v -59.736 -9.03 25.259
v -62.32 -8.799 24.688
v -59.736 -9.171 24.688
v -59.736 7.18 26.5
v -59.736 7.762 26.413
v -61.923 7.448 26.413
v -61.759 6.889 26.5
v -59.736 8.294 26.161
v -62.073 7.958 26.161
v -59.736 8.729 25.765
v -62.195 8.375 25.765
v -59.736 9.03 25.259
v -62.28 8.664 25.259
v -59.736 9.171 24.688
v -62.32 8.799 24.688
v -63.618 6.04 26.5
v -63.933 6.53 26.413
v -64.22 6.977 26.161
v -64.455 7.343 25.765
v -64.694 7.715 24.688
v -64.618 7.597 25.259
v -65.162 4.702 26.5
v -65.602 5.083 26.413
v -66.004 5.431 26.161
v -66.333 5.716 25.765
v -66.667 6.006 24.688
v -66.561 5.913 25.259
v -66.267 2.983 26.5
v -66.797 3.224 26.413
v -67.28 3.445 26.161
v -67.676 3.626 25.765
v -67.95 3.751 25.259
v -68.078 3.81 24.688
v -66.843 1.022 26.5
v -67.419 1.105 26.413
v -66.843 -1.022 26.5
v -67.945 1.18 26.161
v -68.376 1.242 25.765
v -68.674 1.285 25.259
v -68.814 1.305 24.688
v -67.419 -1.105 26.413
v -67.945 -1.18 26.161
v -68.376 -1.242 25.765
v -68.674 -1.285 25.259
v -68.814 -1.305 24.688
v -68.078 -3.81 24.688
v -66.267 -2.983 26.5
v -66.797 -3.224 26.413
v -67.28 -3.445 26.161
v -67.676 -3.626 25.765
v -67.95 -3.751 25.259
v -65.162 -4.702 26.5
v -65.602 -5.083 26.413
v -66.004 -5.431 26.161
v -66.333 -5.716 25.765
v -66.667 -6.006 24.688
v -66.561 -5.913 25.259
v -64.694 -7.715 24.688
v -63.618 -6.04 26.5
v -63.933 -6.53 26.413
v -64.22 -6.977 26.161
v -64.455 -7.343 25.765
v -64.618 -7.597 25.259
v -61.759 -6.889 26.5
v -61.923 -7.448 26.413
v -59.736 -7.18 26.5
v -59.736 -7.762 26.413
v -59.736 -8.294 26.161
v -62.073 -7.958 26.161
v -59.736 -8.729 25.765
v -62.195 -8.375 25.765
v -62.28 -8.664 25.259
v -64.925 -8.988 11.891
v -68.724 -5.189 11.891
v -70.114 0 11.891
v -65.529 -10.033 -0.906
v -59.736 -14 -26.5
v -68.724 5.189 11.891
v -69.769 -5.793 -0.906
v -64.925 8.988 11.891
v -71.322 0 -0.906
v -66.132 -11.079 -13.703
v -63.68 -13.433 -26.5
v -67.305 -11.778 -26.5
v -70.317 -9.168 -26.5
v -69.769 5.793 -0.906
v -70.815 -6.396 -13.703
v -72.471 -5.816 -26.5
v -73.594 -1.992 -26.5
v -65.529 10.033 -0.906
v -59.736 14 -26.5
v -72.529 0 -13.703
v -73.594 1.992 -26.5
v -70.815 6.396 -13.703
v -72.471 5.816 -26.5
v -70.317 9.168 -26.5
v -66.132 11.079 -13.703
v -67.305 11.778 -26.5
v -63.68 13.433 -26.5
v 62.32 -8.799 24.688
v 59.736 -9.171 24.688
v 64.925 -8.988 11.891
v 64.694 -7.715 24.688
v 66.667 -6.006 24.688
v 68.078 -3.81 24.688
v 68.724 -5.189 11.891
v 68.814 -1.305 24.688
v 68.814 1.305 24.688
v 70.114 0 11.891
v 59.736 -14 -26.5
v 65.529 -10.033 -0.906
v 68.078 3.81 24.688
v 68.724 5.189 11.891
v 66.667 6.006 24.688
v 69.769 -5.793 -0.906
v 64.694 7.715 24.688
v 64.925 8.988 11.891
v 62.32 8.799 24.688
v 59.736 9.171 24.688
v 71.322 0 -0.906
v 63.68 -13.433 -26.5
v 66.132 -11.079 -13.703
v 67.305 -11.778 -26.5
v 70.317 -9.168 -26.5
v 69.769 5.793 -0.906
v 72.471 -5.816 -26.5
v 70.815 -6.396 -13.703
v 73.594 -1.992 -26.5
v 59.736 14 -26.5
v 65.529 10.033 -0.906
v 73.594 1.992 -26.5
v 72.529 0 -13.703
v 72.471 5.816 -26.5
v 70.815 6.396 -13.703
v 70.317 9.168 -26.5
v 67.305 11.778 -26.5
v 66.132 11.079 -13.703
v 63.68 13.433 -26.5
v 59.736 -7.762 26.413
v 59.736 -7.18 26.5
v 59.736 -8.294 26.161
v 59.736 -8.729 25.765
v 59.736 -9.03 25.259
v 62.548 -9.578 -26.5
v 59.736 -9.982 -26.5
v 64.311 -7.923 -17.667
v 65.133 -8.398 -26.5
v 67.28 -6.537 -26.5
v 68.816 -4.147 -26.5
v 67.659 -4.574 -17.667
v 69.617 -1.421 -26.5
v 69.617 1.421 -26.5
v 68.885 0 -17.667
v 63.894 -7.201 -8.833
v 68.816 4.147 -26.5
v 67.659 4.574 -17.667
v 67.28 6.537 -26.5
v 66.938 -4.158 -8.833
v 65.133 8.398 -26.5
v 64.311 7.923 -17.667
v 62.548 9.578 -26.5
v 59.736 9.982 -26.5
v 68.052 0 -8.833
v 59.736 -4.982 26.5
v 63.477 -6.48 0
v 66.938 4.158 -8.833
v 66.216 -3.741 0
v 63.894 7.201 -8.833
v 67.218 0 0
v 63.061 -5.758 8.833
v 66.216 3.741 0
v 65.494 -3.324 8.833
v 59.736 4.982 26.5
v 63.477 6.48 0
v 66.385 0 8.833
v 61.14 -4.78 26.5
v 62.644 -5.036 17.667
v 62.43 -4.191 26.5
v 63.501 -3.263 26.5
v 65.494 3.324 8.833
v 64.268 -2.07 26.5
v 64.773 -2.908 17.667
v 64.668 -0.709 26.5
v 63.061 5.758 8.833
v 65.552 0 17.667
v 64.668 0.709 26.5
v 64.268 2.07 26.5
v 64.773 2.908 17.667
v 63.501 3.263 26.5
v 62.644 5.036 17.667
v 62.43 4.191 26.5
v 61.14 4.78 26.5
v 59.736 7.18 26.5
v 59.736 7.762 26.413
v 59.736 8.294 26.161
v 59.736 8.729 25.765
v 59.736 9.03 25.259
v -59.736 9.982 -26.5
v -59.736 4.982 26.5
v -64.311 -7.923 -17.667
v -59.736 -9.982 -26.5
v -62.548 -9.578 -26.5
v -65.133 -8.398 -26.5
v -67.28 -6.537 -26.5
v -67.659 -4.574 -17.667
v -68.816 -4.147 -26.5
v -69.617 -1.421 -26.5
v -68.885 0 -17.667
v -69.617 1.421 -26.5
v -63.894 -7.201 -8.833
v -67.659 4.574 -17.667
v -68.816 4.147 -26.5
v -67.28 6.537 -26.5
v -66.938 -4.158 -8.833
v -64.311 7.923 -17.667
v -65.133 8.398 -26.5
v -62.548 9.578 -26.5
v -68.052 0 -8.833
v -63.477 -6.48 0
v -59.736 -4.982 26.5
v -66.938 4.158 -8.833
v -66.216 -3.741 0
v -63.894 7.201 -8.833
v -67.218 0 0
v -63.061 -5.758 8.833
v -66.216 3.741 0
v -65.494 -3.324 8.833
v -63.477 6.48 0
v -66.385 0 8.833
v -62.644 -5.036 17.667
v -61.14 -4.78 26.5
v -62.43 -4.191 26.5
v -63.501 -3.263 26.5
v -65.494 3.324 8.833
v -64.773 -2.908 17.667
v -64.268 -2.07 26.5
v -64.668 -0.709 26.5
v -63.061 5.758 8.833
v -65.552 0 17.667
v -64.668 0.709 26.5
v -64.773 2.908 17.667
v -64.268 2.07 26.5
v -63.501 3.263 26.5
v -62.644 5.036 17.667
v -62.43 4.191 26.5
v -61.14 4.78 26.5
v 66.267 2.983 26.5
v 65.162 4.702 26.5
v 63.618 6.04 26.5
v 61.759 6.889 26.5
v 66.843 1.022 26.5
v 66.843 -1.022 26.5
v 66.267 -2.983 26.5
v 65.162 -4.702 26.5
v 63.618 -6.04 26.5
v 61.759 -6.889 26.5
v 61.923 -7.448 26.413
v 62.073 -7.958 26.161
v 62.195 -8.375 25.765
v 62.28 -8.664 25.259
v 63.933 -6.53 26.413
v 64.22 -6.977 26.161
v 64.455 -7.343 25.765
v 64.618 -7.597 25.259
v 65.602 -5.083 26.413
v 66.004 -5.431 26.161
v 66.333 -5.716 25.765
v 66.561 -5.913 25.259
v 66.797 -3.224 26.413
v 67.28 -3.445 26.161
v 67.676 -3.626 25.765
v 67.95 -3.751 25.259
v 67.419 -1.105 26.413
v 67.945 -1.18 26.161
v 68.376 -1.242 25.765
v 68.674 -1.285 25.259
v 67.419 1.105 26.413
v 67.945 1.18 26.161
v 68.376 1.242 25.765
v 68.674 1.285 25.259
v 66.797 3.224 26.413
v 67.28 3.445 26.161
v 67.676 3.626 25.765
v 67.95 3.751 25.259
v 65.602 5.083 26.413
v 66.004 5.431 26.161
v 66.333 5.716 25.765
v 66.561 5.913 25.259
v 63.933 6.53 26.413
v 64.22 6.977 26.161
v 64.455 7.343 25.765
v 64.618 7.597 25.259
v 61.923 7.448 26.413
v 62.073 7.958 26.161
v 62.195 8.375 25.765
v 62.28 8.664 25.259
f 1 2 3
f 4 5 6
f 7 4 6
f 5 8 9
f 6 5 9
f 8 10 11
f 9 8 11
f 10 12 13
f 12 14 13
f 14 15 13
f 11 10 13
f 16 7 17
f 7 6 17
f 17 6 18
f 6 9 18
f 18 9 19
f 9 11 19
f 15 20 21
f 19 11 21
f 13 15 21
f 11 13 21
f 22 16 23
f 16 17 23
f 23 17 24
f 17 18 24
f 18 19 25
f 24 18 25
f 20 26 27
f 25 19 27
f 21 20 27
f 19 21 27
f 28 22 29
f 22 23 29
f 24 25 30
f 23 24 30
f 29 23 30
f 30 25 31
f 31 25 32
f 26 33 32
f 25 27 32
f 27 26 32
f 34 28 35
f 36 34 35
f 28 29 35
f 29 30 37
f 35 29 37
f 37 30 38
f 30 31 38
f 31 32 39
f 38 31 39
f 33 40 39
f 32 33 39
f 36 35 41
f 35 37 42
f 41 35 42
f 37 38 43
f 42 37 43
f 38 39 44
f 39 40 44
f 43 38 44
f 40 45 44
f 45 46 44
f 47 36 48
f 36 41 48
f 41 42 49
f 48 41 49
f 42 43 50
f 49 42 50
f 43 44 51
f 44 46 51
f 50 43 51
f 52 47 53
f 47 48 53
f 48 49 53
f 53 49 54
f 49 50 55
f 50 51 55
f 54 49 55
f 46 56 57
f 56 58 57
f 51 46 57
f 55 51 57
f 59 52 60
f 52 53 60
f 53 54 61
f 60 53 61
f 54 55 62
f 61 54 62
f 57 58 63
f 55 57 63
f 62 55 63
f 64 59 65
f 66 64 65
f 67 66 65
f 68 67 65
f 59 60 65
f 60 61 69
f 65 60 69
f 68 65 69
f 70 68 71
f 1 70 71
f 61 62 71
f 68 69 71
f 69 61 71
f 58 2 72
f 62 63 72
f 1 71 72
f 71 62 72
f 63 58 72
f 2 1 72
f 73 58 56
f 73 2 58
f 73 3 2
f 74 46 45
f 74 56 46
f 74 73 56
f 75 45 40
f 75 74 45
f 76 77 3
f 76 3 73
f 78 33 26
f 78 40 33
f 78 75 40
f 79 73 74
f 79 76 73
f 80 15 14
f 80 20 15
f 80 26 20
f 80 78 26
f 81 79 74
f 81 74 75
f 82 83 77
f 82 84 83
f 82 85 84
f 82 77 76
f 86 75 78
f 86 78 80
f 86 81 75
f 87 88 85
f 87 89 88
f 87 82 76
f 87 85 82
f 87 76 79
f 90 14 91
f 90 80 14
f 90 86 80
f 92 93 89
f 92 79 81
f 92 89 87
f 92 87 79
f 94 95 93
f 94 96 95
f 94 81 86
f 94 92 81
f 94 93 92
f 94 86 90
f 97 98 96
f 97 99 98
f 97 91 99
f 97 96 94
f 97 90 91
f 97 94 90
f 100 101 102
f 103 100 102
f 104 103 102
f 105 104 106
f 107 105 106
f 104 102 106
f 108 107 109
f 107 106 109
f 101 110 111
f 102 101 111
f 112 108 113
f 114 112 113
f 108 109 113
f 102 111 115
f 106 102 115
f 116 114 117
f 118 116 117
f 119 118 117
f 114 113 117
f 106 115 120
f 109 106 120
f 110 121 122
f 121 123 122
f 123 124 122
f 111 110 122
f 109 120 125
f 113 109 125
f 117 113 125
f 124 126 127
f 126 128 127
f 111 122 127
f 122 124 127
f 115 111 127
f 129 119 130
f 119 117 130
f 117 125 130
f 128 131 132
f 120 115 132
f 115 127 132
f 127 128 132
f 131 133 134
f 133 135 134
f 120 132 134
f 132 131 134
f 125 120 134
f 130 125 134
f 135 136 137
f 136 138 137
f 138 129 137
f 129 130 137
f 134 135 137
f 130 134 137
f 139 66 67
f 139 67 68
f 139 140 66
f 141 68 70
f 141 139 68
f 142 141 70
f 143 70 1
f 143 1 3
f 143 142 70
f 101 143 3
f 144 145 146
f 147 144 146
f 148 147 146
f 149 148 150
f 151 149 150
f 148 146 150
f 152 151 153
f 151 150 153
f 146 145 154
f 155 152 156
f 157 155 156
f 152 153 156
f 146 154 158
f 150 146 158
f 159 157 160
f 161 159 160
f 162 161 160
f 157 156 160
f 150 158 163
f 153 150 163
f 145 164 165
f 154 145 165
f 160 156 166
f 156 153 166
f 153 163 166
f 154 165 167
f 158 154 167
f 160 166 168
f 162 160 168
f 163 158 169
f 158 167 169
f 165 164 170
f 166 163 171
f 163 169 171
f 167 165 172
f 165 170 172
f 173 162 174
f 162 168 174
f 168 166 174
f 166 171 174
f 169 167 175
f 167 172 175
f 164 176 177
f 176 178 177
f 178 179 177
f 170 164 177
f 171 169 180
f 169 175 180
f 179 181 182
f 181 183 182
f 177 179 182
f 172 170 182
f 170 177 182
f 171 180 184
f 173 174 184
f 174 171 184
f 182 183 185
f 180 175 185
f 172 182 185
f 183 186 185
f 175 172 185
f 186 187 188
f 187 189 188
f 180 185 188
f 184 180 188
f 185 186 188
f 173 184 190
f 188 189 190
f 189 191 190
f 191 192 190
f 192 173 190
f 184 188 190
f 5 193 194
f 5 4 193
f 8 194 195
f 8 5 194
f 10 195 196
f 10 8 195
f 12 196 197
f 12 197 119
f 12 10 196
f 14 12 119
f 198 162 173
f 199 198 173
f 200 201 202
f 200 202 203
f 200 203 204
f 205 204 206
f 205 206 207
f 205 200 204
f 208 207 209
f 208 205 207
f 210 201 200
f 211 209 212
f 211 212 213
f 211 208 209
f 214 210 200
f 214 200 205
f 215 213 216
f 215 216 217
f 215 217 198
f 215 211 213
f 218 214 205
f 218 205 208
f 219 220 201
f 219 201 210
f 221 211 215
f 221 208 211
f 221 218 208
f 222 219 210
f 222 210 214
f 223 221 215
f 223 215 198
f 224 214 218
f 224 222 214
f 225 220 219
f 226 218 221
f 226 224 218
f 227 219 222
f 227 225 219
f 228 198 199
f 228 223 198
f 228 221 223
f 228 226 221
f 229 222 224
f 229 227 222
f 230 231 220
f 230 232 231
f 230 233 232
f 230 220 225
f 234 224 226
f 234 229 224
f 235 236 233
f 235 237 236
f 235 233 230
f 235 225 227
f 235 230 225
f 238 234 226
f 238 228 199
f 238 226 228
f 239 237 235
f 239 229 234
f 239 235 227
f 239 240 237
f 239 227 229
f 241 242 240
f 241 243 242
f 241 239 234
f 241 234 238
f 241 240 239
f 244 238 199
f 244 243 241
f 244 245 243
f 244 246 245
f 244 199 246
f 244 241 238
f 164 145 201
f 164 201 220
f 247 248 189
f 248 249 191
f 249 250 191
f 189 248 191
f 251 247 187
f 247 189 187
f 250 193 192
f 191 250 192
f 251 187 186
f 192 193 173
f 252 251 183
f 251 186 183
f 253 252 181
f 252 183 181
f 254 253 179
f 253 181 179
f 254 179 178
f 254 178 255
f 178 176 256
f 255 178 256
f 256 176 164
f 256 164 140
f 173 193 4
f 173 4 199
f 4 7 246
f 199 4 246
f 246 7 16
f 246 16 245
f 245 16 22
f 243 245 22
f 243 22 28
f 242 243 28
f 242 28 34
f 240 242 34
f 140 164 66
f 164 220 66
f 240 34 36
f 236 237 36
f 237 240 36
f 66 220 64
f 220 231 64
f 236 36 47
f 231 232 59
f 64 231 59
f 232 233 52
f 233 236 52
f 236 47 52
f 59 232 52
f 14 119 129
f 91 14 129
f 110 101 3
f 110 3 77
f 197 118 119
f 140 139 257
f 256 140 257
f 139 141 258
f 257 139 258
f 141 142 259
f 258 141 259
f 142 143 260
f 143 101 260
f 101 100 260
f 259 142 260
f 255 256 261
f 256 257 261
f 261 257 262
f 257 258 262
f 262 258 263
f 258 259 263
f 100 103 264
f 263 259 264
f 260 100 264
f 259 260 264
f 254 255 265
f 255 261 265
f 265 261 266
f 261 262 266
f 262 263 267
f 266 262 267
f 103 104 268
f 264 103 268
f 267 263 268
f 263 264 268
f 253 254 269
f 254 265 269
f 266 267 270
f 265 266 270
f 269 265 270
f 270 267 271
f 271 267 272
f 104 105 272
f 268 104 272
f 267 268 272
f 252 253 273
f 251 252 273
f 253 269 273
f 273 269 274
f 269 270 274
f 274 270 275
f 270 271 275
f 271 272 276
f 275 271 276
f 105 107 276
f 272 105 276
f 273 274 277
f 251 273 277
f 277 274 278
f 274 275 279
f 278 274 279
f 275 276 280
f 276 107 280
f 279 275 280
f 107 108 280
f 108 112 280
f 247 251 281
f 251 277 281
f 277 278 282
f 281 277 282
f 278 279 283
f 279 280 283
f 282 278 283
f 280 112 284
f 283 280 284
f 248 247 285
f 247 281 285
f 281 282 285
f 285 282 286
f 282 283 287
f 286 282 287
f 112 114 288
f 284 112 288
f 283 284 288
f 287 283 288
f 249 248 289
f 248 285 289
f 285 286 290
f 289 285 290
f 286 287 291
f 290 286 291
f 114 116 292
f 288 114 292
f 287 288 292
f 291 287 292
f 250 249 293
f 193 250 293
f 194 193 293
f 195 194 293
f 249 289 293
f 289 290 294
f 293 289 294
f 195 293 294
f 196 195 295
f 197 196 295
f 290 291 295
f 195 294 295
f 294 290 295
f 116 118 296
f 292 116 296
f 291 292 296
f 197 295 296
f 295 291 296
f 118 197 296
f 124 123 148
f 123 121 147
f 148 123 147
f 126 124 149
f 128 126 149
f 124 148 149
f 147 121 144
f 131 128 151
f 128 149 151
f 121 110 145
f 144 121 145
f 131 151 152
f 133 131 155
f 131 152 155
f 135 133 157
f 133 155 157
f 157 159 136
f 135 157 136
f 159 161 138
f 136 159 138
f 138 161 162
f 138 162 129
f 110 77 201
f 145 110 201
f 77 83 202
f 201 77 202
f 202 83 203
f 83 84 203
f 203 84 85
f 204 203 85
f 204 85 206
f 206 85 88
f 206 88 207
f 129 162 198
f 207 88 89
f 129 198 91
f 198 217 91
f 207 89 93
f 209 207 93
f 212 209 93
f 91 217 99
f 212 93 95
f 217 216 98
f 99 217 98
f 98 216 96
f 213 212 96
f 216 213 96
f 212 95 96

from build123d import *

# Parameters (mm, degrees)
F1_ANGLE_BACK = 90
F1_ANGLE      = 180
F3_DEPTH      = 119.4722198035
F4_R          = 2


with BuildPart() as f1:
    # F0 (on Front) → F1 (revolve)
    with BuildSketch(Plane.XZ, mode=Mode.PRIVATE) as f1_sk:
        Polygon((-73.7361099018, -26.5), (-69.7183494024, -26.5), (-64.7183494024, 26.5), (-68.7361099018, 26.5), align=None)
    revolve(f1_sk.sketch.rotate(Axis((-59.7361099018, 0, 0), (0, 0, -1)), -F1_ANGLE_BACK), axis=Axis((-59.7361099018, 0, 0), (0, 0, -1)), revolution_arc=F1_ANGLE)


with BuildPart() as f2_1:
    # F2: instance of F1
    add(f1.part.mirror(Plane.YZ))


with BuildPart() as f1_1:
    add(f1.part)

    # F3 (add, through all): faces of the model
    f3_faces = [f1_1.faces().sort_by_distance(p)[0] for p in [
        (-59.7361099018, -9.4911197503, 0),
        (-59.7361099018, 9.4911197503, 0),
    ]]

    add(f2_1.part)  # F3 merges F2_1
    extrude(f3_faces, amount=F3_DEPTH)

    # F4
    f4_edges = [f1_1.edges().sort_by_distance(p)[0] for p in [
        (68.73611, 0, 26.5),
    ]]
    fillet(f4_edges, radius=F4_R)


solid = f1_1.part
